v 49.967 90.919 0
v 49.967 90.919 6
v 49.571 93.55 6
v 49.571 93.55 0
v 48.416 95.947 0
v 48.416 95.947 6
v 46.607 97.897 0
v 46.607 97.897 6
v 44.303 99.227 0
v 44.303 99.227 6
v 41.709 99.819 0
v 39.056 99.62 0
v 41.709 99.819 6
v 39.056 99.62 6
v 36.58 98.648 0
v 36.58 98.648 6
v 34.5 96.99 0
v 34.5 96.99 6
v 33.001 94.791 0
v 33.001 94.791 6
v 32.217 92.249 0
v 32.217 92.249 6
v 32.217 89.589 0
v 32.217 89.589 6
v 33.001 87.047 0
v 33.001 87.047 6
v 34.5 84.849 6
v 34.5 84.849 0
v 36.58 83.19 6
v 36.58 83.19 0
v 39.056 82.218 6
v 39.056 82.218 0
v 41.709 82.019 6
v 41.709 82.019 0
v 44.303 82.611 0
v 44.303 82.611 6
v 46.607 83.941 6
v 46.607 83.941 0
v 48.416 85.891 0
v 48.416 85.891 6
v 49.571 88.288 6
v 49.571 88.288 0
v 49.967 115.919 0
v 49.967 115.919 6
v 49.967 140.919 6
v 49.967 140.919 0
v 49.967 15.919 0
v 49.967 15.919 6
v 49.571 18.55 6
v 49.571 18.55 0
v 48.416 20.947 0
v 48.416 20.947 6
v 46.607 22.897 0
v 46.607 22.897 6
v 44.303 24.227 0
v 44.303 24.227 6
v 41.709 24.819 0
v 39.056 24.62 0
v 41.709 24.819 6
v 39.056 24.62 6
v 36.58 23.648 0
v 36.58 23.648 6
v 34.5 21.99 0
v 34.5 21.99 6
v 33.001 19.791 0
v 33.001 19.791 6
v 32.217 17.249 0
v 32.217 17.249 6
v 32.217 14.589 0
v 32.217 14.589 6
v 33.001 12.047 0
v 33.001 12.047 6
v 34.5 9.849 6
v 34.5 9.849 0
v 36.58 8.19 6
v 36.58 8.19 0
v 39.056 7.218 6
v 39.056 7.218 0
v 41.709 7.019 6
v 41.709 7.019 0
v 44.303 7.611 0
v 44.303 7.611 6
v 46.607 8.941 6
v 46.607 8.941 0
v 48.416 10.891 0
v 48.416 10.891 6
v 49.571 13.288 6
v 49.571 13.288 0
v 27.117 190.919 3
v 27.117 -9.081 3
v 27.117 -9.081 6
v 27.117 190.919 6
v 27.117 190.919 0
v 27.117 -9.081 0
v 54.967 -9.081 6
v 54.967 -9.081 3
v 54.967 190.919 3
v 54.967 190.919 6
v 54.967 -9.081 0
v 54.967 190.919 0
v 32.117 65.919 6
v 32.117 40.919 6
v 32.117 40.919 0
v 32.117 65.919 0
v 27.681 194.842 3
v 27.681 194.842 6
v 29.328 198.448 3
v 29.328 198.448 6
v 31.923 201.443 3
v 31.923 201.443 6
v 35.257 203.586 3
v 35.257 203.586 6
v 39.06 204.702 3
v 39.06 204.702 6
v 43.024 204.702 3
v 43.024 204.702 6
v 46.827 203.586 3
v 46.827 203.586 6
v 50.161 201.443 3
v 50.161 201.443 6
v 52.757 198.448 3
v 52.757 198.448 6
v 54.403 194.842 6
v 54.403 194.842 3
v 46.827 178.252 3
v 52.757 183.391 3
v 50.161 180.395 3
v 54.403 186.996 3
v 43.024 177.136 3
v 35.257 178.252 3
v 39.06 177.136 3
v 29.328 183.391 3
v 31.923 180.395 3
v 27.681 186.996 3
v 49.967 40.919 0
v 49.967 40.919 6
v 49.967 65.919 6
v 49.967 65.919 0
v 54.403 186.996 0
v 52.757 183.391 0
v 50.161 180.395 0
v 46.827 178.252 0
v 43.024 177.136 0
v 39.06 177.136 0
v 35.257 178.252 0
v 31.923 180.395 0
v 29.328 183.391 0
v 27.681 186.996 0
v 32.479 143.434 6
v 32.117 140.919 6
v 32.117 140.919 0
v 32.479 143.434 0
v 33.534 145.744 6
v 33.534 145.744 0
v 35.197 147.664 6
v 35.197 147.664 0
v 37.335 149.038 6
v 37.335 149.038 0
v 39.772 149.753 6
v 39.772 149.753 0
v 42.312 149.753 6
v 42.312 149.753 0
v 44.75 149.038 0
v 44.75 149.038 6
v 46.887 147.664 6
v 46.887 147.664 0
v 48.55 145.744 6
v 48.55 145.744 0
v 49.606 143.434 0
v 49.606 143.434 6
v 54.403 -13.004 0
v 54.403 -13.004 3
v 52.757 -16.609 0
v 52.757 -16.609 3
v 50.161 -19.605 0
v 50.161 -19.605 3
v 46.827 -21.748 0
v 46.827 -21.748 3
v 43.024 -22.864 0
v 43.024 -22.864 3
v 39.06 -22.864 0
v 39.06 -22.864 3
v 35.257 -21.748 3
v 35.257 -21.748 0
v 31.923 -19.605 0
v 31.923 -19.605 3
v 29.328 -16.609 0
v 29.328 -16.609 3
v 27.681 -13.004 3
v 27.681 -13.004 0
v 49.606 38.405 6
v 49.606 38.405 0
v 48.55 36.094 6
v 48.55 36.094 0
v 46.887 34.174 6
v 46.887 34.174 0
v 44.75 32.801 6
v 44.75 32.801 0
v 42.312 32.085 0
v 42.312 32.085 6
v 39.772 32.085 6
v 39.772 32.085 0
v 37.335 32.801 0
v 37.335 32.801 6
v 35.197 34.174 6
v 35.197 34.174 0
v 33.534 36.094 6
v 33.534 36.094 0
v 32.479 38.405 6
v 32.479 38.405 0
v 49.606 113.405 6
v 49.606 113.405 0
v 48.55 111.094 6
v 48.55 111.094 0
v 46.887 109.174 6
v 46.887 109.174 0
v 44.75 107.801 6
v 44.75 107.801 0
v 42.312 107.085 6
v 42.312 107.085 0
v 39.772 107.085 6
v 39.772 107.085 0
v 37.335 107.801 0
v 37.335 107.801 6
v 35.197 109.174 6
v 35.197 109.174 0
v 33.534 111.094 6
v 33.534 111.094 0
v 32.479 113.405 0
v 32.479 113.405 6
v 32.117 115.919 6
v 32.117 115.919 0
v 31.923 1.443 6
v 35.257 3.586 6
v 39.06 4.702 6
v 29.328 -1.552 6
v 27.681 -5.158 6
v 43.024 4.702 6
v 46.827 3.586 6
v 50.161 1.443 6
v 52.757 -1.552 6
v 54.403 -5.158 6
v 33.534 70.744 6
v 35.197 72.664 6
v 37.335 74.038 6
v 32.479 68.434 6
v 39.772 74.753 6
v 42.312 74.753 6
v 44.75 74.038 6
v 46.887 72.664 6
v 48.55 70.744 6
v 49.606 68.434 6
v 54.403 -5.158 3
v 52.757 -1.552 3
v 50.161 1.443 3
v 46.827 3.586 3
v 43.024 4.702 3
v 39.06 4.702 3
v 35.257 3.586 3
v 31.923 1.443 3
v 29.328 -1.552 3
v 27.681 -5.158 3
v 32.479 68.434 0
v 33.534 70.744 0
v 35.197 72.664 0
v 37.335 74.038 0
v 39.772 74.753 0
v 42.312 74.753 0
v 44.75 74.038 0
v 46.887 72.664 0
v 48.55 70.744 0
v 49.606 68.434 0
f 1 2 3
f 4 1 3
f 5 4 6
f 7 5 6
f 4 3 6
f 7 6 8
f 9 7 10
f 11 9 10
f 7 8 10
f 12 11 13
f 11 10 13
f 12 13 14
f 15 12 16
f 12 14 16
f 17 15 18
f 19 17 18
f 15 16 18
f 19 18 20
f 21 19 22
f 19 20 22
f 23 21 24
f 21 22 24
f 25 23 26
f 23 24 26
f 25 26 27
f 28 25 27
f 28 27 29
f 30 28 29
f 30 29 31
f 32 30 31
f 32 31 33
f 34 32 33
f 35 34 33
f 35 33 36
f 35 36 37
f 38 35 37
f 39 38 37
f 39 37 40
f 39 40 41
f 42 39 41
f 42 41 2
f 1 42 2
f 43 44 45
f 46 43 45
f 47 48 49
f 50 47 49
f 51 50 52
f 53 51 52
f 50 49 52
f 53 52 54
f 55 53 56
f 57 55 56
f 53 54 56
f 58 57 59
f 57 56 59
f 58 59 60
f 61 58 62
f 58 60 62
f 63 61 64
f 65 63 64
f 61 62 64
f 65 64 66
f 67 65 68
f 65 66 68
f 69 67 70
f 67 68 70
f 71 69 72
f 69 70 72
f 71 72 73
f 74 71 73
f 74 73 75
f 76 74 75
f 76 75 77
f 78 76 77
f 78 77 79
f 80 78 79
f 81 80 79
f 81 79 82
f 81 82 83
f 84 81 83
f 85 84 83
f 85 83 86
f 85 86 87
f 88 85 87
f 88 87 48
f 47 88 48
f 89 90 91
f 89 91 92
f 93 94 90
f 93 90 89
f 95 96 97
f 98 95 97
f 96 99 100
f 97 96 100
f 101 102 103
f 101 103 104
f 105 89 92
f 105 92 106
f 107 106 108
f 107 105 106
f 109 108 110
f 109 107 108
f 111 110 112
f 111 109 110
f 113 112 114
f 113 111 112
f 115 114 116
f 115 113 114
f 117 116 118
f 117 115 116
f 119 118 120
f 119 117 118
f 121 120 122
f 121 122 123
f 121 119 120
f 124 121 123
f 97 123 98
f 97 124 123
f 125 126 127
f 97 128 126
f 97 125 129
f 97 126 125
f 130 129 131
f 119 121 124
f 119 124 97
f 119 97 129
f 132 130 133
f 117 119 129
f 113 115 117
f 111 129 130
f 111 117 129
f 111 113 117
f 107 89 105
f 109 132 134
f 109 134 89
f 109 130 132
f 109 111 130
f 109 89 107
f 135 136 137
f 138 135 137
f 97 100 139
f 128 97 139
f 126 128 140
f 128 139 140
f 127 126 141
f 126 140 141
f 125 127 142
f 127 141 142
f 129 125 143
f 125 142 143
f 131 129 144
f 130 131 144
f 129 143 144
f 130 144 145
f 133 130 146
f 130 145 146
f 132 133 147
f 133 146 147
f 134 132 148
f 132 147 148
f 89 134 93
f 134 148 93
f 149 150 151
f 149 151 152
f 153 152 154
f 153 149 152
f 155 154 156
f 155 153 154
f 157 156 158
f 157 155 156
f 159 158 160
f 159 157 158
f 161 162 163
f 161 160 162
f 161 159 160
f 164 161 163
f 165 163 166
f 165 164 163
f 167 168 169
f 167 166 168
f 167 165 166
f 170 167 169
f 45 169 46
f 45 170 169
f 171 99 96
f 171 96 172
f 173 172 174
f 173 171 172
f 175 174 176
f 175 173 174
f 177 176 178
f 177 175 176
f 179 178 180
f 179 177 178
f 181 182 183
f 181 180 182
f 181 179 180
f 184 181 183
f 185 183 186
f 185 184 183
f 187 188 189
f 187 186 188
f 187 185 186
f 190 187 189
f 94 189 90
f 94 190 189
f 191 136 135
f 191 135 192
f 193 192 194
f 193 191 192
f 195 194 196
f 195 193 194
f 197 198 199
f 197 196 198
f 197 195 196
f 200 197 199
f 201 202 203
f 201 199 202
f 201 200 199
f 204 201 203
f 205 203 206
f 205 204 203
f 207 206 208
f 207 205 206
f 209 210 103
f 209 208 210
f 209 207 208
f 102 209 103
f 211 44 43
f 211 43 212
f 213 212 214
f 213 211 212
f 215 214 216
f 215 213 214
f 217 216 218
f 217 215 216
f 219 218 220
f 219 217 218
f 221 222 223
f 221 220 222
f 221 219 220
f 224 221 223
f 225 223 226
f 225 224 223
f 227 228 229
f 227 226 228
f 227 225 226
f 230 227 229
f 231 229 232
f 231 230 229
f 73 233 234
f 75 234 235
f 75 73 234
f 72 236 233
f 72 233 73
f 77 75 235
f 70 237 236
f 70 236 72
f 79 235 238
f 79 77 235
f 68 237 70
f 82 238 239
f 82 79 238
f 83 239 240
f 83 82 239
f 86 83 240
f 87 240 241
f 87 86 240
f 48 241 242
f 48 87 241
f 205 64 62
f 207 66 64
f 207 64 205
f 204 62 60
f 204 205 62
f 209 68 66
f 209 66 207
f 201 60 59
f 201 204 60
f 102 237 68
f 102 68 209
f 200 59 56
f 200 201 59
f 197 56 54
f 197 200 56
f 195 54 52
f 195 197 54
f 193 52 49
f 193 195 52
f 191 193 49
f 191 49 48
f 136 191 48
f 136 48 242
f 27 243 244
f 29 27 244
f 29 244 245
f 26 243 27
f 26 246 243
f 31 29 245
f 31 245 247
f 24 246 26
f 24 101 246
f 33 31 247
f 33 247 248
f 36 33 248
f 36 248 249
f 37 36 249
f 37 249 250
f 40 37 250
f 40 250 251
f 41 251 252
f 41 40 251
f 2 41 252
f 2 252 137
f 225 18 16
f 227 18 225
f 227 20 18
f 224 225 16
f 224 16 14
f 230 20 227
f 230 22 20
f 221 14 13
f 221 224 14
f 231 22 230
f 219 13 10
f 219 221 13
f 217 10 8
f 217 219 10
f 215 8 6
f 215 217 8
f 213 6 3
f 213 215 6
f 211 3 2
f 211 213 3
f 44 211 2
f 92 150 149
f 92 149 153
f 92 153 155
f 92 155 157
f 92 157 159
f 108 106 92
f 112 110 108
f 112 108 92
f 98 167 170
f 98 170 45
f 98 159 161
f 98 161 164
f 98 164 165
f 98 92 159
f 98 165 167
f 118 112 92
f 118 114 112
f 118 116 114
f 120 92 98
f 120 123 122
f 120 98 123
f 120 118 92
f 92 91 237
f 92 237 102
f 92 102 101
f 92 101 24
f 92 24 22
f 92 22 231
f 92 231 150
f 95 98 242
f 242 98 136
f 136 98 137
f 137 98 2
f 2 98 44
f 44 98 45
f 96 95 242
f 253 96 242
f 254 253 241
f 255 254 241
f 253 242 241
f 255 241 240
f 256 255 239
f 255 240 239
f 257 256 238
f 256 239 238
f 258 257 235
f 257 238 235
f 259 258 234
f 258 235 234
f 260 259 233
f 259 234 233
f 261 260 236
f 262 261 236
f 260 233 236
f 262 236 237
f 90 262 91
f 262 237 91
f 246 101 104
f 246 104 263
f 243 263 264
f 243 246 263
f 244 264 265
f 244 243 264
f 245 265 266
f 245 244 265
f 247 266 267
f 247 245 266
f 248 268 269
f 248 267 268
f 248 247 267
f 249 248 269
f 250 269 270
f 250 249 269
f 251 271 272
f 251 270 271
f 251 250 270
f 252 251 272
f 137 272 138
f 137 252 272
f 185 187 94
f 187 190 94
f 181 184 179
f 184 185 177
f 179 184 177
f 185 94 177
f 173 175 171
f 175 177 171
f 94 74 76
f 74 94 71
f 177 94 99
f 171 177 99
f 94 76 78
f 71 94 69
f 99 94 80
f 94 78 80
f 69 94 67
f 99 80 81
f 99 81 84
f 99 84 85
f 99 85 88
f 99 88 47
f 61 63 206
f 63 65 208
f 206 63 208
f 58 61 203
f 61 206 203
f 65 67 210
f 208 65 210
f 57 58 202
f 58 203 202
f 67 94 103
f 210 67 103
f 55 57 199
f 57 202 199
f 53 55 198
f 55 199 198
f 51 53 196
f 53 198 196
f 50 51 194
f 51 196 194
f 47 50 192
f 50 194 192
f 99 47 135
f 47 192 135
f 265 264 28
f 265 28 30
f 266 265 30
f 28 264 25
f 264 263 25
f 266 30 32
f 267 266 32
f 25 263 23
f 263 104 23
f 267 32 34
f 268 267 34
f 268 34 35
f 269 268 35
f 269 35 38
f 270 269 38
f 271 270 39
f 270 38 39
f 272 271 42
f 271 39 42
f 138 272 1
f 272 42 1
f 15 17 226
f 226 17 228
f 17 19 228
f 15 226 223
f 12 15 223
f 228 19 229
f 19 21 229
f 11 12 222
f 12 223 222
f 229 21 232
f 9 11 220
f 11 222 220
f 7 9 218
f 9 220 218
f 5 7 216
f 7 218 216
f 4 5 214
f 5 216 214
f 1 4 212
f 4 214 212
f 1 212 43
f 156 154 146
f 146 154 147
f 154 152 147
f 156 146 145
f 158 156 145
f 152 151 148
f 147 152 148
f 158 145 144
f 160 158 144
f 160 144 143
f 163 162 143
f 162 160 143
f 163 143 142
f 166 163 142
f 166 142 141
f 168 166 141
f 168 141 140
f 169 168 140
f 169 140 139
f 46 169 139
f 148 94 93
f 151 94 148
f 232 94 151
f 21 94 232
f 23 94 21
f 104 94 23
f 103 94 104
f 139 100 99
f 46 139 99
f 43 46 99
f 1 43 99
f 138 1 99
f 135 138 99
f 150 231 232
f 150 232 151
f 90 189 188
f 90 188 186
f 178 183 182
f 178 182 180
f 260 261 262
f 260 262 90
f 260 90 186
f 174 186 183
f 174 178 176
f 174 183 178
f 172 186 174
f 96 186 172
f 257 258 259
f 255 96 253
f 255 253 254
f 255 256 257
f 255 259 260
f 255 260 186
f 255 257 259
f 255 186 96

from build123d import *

# Parameters (mm, degrees)
ESQUISSE1_W             = 27.85
ESQUISSE1_H             = 200
BOSS_EXTRU_1_DEPTH      = 6
ESQUISSE2_R             = 13.925
ENL_V_MAT_EXTRU_1_DEPTH = 3
ESQUISSE3_R             = 13.925
ENL_V_MAT_EXTRU_2_DEPTH = 3
ESQUISSE5_W             = 17.85
ESQUISSE5_H             = 25
ESQUISSE5_R             = 8.925
ENL_V_MAT_EXTRU_3_DEPTH = 10


with BuildPart() as part:
    # Esquisse1 → Boss.-Extru.1 (new body)
    with BuildSketch(Plane.XY):
        with Locations((41.042105263, 90.919078947)):
            Rectangle(ESQUISSE1_W, ESQUISSE1_H)
        with BuildLine():
            Line((27.117105263, -9.080921053), (54.967105263, -9.080921053))
            ThreePointArc((54.967105263, -9.080921053), (41.042105263, -23.005921053), (27.117105263, -9.080921053))
        make_face()
        with BuildLine():
            ThreePointArc((27.117105263, 190.919078947), (41.042105263, 204.844078947), (54.967105263, 190.919078947))
            Line((54.967105263, 190.919078947), (27.117105263, 190.919078947))
        make_face()
    extrude(amount=BOSS_EXTRU_1_DEPTH)

    # Esquisse2 → Enlèv. mat.-Extru.1 (cut)
    with BuildSketch(Plane.XY.offset(6)):
        with Locations((41.042105263, -9.080921053)):
            Circle(ESQUISSE2_R)
    extrude(amount=-ENL_V_MAT_EXTRU_1_DEPTH, mode=Mode.SUBTRACT)

    # Esquisse3 → Enlèv. mat.-Extru.2 (cut)
    with BuildSketch(Plane(origin=(0, 0, 0), x_dir=(-1, 0, 0), z_dir=(0, 0, -1))):
        with Locations((-41.042105263, 190.919078947)):
            Circle(ESQUISSE3_R)
    extrude(amount=-ENL_V_MAT_EXTRU_2_DEPTH, mode=Mode.SUBTRACT)

    # Esquisse5 → Enlèv. mat.-Extru.3 (cut)
    with BuildSketch(Plane.XY.offset(6)):
        with BuildLine():
            ThreePointArc((32.117105263, 140.919078947), (41.042105263, 149.844078947), (49.967105263, 140.919078947))
            Line((49.967105263, 140.919078947), (32.117105263, 140.919078947))
        make_face()
        with Locations((41.042105263, 128.419078947)):
            Rectangle(ESQUISSE5_W, ESQUISSE5_H)
        with BuildLine():
            ThreePointArc((49.967105263, 115.919078947), (41.042105263, 106.994078947), (32.117105263, 115.919078947))
            Line((32.117105263, 115.919078947), (49.967105263, 115.919078947))
        make_face()
        with Locations((41.042105263, 90.919078947)):
            Circle(ESQUISSE5_R)
        with BuildLine():
            ThreePointArc((32.117105263, 65.919078947), (41.042105263, 74.844078947), (49.967105263, 65.919078947))
            Line((49.967105263, 65.919078947), (32.117105263, 65.919078947))
        make_face()
        with Locations((41.042105263, 53.419078947)):
            Rectangle(ESQUISSE5_W, ESQUISSE5_H)
        with BuildLine():
            Line((32.117105263, 40.919078947), (49.967105263, 40.919078947))
            ThreePointArc((49.967105263, 40.919078947), (41.042105263, 31.994078947), (32.117105263, 40.919078947))
        make_face()
        with Locations((41.042105263, 15.919078947)):
            Circle(ESQUISSE5_R)
    extrude(amount=-ENL_V_MAT_EXTRU_3_DEPTH, mode=Mode.SUBTRACT)


solid = part.part
